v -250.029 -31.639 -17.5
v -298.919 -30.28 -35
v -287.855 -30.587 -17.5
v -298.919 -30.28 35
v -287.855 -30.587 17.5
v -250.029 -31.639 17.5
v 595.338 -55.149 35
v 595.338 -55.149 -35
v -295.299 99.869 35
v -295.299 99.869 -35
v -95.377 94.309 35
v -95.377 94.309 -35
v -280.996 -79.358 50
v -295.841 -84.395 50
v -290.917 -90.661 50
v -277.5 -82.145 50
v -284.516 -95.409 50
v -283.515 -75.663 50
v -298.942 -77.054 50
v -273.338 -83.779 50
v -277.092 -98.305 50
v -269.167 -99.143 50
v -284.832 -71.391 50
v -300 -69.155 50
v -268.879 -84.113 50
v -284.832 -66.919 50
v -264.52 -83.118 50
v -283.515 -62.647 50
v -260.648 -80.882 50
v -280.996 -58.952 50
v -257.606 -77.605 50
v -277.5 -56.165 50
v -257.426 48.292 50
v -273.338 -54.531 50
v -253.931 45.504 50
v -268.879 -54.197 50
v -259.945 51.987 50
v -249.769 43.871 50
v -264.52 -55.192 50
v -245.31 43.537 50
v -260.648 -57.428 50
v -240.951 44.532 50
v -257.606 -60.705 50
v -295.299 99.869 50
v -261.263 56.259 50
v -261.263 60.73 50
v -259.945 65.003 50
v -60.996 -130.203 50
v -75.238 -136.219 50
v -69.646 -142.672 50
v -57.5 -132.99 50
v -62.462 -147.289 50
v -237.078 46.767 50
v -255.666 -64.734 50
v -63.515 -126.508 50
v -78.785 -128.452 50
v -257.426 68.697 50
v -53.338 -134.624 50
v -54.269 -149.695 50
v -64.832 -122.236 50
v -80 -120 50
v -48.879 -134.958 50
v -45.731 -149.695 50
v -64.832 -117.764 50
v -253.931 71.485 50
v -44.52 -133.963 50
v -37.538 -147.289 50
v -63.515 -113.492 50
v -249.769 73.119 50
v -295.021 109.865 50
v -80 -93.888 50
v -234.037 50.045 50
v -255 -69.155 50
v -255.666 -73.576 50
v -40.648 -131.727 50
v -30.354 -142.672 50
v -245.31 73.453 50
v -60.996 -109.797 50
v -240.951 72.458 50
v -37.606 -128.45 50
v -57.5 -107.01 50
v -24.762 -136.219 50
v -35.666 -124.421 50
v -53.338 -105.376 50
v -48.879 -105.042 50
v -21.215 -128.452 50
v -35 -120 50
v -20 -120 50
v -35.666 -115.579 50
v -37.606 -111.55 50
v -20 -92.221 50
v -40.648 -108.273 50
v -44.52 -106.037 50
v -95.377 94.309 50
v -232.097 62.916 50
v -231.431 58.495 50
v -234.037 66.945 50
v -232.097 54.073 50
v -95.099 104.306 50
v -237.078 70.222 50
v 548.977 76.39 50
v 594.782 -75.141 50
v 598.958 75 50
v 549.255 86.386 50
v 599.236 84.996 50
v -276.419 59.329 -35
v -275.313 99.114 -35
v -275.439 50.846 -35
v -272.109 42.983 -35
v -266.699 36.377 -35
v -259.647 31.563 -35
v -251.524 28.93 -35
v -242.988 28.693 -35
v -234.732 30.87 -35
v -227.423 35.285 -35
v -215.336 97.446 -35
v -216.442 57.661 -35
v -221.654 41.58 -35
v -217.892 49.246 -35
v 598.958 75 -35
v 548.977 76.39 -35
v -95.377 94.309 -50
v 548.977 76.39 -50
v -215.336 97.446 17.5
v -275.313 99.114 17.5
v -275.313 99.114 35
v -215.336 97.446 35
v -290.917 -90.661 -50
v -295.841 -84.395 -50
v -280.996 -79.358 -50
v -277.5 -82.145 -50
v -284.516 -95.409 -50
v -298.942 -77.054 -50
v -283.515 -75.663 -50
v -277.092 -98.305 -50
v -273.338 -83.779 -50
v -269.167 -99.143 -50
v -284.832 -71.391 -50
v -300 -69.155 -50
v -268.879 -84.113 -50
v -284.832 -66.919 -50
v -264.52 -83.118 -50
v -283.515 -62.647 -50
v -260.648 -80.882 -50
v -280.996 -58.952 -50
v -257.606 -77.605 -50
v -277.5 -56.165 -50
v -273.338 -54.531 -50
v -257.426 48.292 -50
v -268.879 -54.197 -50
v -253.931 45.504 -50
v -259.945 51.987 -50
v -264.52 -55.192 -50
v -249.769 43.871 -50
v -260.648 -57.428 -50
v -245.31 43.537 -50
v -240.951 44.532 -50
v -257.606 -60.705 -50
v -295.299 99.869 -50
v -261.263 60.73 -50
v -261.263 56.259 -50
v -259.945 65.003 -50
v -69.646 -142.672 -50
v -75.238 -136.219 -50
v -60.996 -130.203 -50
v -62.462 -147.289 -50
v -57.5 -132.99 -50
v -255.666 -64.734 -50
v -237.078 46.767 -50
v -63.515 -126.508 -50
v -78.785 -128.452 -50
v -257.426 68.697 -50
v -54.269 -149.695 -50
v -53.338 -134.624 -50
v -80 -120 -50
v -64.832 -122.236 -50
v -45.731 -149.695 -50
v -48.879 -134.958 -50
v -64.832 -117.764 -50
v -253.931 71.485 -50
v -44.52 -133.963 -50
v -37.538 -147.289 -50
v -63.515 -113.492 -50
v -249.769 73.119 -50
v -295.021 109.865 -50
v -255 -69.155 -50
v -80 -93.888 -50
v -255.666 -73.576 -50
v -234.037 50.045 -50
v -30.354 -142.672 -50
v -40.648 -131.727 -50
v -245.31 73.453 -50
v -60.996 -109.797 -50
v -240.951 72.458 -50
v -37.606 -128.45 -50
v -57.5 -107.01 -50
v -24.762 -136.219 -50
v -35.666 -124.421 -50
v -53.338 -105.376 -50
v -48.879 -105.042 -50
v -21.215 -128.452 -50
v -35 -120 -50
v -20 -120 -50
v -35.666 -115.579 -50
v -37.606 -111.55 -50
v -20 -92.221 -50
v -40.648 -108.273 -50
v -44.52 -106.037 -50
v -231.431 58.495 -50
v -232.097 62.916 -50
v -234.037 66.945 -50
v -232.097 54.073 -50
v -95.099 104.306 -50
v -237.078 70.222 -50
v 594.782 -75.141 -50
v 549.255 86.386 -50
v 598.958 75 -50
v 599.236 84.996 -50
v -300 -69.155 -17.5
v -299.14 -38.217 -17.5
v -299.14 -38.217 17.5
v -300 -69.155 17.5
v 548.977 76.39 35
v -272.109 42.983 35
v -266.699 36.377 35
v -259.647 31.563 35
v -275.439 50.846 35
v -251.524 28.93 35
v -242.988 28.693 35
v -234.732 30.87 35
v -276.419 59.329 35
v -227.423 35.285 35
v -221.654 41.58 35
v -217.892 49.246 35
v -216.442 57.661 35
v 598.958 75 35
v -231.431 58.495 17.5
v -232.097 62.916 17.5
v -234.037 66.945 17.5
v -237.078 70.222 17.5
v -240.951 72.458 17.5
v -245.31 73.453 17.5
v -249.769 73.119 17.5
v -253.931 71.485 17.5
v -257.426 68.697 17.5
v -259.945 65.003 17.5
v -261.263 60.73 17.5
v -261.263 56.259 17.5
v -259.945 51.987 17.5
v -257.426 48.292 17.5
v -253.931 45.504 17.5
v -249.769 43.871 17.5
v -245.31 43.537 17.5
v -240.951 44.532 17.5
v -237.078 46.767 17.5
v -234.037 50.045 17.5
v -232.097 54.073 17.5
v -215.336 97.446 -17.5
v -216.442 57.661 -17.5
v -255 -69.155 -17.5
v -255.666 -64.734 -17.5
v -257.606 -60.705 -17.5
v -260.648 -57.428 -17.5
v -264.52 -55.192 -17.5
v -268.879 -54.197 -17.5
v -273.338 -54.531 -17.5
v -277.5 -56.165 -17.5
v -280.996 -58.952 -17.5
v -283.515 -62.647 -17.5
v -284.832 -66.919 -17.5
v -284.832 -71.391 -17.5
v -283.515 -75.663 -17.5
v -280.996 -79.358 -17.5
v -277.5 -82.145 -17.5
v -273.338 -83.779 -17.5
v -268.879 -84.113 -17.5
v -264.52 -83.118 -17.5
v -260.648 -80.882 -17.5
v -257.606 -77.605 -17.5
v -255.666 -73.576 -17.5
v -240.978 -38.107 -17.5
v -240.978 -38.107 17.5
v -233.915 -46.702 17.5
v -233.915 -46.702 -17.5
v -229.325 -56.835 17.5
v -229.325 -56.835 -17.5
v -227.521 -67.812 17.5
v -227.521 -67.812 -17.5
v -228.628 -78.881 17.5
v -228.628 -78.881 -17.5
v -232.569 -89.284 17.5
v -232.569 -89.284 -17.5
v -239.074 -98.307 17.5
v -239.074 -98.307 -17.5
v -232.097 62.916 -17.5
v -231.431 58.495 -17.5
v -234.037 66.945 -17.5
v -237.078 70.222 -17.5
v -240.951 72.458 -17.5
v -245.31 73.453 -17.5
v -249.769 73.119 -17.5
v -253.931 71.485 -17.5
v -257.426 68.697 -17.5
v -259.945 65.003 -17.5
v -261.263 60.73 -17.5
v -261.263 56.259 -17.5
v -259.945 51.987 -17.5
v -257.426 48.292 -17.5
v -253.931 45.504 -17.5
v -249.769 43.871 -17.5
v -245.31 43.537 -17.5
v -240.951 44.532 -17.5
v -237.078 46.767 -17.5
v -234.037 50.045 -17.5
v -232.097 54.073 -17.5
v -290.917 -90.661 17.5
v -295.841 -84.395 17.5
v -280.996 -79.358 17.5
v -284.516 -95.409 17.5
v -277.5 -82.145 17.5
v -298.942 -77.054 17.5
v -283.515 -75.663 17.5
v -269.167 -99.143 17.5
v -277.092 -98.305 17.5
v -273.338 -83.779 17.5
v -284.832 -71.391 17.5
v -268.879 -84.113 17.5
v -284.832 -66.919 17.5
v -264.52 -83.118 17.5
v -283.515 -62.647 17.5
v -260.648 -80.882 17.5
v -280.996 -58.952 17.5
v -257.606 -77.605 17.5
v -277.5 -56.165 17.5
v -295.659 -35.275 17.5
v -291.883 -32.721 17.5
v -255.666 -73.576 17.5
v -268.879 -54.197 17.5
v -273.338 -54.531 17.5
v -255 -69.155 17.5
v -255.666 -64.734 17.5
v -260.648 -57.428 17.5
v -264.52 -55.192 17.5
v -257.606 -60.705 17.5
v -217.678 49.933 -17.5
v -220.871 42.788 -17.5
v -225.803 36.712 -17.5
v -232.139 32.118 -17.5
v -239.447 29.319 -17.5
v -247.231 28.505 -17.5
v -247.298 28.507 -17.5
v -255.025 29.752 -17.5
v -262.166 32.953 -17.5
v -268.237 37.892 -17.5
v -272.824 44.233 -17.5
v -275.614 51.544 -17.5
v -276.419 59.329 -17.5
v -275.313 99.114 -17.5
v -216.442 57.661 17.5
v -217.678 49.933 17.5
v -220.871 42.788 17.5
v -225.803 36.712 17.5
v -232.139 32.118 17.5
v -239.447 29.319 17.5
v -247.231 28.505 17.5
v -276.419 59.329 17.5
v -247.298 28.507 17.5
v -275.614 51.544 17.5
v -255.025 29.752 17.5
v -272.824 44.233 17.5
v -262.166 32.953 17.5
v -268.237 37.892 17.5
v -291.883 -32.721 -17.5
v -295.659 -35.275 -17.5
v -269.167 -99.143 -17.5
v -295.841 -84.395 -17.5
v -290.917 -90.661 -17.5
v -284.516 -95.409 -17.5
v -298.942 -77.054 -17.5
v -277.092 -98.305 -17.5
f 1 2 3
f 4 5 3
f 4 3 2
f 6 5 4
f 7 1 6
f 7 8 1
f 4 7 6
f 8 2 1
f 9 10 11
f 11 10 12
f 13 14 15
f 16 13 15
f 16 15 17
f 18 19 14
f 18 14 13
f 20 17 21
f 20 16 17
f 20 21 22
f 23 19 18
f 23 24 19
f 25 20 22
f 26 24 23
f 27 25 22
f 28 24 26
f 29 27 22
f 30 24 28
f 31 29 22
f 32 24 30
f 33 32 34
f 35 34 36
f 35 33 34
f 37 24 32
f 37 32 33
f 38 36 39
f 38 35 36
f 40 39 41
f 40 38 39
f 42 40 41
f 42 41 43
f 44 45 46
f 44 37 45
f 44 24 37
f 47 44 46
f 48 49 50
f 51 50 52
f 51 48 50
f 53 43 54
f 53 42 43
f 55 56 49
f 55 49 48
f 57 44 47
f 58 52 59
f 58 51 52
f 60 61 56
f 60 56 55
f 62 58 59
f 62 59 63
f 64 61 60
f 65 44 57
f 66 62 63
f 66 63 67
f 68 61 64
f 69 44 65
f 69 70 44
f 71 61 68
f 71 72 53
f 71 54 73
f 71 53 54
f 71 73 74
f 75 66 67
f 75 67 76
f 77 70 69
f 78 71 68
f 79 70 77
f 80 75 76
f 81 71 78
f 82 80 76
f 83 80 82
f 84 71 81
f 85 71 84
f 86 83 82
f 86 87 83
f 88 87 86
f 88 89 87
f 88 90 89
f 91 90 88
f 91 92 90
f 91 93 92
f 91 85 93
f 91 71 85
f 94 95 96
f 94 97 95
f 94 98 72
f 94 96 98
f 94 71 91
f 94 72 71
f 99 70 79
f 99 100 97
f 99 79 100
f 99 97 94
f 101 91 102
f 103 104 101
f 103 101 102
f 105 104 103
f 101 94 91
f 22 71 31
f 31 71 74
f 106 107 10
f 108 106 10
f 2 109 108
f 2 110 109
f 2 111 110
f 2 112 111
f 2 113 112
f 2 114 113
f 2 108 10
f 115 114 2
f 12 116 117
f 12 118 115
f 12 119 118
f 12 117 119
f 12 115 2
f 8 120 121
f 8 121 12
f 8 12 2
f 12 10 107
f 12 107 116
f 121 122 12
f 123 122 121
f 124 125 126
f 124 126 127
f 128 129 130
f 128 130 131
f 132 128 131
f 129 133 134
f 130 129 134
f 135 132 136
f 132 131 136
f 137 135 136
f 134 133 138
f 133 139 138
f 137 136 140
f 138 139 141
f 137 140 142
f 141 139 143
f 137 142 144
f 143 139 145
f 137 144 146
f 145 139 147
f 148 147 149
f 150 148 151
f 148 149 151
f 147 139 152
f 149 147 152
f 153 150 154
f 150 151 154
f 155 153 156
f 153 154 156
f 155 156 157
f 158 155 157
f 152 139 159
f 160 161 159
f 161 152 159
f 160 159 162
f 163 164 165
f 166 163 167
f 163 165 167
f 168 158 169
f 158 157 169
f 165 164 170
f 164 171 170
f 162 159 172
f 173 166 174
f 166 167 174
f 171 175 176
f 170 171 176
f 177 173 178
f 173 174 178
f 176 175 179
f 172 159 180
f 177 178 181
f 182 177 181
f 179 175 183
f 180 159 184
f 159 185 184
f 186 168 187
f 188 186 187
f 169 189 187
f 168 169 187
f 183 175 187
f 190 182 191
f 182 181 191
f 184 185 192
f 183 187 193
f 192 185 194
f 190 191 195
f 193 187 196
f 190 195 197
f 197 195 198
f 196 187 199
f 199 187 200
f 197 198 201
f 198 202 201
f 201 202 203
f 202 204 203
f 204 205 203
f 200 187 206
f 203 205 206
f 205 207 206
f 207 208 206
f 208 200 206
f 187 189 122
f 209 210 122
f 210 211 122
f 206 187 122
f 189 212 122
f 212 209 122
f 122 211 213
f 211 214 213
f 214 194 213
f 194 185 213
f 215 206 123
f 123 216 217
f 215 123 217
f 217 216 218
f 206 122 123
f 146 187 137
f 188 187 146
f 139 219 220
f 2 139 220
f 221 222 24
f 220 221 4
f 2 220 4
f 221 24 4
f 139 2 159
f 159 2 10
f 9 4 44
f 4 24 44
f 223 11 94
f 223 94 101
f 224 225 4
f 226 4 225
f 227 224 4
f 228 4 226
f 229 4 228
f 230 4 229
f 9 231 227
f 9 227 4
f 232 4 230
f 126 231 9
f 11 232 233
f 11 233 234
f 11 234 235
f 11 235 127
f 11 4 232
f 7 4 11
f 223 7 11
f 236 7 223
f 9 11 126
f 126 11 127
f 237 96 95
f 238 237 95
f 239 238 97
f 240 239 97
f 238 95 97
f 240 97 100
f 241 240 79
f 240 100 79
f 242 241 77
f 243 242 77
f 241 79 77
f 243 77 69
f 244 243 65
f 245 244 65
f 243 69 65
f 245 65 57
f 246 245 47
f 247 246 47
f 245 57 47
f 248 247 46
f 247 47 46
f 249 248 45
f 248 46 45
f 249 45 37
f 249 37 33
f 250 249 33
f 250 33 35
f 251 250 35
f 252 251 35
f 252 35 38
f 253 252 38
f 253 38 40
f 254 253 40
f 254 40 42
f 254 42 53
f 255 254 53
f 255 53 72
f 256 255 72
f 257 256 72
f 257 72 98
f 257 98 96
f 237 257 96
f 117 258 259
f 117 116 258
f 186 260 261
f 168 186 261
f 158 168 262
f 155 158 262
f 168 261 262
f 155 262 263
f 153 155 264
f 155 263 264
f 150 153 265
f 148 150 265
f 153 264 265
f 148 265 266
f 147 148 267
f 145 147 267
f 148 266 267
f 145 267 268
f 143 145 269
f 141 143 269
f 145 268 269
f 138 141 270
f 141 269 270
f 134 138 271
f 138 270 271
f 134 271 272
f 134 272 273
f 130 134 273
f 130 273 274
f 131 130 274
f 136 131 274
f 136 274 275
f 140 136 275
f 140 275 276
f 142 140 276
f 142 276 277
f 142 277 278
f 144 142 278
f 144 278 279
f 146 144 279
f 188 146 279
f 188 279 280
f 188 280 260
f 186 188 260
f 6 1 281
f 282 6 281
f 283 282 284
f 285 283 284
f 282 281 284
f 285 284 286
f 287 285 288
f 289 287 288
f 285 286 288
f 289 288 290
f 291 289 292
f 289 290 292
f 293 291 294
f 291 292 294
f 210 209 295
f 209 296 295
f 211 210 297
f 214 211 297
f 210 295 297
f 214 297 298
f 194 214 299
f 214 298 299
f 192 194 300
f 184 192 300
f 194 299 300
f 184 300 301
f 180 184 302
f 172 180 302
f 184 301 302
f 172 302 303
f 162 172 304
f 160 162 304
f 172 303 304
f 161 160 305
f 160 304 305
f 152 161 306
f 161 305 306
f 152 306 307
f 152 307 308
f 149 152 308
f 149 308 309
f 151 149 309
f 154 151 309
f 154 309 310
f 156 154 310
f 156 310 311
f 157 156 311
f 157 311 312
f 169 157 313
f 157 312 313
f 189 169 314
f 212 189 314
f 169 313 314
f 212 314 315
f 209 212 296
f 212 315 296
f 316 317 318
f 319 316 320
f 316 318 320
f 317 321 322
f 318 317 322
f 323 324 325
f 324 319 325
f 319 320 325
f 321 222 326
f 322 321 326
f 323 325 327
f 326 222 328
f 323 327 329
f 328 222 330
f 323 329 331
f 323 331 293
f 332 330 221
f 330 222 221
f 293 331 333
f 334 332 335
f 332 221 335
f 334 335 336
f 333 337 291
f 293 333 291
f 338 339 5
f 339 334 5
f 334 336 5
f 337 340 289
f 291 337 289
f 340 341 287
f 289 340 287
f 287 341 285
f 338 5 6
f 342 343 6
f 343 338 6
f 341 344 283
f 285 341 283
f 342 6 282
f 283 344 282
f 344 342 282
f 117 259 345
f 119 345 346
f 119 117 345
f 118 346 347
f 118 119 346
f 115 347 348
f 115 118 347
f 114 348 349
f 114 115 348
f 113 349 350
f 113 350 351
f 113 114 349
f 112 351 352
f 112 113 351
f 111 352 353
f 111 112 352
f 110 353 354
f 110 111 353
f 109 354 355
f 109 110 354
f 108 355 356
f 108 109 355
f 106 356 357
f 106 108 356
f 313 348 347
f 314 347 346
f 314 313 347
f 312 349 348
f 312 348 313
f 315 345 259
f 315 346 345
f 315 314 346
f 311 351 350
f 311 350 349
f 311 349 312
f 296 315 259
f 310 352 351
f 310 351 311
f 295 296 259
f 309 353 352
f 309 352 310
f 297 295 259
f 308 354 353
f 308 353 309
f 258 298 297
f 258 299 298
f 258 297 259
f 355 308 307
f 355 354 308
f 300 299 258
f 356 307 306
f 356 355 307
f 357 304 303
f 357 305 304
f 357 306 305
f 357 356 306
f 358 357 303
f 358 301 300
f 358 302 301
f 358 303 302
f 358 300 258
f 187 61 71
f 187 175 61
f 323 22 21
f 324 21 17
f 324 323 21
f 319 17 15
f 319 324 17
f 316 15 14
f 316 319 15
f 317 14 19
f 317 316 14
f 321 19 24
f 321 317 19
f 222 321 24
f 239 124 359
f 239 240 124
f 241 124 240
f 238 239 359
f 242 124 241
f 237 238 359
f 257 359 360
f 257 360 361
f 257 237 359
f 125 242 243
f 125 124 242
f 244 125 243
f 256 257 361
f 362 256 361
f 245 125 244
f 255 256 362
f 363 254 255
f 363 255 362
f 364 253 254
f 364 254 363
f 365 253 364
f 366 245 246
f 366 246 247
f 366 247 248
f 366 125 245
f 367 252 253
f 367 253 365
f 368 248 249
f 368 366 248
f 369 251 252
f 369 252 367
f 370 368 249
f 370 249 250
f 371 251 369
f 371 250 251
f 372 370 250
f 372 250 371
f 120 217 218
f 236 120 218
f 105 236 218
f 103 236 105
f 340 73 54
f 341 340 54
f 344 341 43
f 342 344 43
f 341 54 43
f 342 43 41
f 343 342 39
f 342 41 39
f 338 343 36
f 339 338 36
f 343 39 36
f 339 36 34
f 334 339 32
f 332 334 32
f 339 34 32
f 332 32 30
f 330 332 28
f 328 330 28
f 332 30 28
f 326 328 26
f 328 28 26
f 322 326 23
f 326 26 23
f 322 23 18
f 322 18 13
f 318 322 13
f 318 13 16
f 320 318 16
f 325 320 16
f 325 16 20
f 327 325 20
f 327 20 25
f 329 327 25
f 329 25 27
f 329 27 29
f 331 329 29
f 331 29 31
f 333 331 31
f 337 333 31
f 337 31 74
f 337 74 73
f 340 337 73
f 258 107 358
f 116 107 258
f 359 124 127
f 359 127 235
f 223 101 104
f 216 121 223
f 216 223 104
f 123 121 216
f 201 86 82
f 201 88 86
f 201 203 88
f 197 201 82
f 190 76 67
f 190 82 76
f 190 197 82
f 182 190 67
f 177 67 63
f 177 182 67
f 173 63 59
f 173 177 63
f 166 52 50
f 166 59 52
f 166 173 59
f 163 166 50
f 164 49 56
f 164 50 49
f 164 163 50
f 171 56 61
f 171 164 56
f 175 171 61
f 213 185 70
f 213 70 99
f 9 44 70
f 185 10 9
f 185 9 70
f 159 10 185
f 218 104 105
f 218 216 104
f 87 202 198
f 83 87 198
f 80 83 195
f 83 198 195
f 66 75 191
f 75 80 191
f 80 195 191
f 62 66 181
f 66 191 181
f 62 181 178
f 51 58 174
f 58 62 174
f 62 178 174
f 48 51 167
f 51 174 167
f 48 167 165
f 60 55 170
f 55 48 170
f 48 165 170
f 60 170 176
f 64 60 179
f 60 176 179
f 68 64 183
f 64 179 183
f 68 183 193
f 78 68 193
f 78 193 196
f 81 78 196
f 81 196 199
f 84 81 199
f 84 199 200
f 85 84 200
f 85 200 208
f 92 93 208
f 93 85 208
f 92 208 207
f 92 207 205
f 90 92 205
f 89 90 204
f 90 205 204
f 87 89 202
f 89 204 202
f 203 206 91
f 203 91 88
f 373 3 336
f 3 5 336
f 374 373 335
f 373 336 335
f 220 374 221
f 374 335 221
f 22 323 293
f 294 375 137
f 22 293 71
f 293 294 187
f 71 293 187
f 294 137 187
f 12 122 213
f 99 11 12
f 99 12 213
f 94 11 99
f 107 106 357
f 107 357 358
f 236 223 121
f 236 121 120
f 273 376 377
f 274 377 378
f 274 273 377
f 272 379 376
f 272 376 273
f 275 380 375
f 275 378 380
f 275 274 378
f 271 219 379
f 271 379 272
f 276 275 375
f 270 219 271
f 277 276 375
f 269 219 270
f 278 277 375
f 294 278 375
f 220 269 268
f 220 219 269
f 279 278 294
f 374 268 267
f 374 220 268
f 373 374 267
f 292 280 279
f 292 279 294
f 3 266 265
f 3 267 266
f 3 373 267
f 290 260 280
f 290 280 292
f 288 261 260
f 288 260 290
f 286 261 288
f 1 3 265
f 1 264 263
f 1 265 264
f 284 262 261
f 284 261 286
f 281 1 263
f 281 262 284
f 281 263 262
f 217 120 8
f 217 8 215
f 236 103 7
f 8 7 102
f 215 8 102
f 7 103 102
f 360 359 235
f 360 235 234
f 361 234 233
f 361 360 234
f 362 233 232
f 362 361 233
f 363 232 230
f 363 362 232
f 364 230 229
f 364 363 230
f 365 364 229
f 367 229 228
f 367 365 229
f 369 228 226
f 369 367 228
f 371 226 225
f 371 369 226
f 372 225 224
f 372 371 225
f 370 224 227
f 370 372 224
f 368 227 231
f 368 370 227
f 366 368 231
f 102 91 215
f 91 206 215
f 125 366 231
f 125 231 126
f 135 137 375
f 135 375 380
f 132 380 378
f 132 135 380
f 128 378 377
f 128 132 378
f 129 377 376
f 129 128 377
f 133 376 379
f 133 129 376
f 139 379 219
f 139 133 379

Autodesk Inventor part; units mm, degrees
ref_plane "YZ Plane" through (0, 0, 0) normal (1, 0, 0) x (0, 1, 0)
ref_plane "XZ Plane" through (0, 0, 0) normal (0, 1, 0) x (-1, 0, 0)
ref_plane "XY Plane" through (0, 0, 0) normal (0, 0, 1) x (1, 0, 0)
sketch "草图1" plane through (0, 0, 0) normal (0, 0, 1) x (1, 0, 0)
  line L0 (598.9577, 75) -> (600, -74.9964)
  line L1 (-601.0423, 75.1267) -> (600, -74.9964) construction
  line L2 (598.9577, 75) -> (-593.8092, -74.3553) construction
  line L3 (-300, 0) -> (-300, 100)
  line L4 (-300, -100) -> (600, -74.9964)
  line L5 (-300, 100) -> (598.9577, 75)
  line L6 (-300, 0) -> (-300, -100)
  line L7 (599.4789, 0) -> (-300, 0)
  line L8 (0, 0) -> (0, -189.9048)
  dimension "d0" = 150
  dimension "d31" = 75
  dimension "d32" = 0
  dimension "d33" = 100
  dimension "d34" = 100
  dimension "d35" = 100
  dimension "d51" = 300
extrude "拉伸1" add sketch "草图1" along normal mid plane 100
sketch "草图2" plane through (0, 0, 0) normal (0, 0, 1) x (1, 0, 0)
  circle A0 centre (-50, -120) radius 15
  line L0 (0, 0) -> (0, -405.8359)
  line L1 (0, 0) -> (-641.787, 0)
  line L2 (-80, -120) -> (-80, -93.888)
  line L3 (-300, -100) -> (600, -74.9964) projected
  line L4 (-20, -92.2211) -> (-20, -120)
  arc A1 (-80, -120) -> (-20, -120) centre (-50, -120) ccw
  dimension "d8" = 30
  dimension "d9" = 120
  dimension "d10" = 50
  dimension "d28" = 30
extrude "拉伸2" add sketch "草图2" along normal mid plane 100
fillet "圆角1" radius 30 1 edges at (-300, -100, 0)
sketch "草图4" plane through (0, 0, 50) normal (0, 0, 1) x (1, 0, 0)
  arc A0 (-300, -69.155) -> (-269.1669, -99.1434) centre (-270, -69.155) ccw projected
  circle A1 centre (-270, -69.155) radius 15
  point P0 (0, 0)
  dimension "d15" = 30
extrude "拉伸3" cut sketch "草图4" against normal blind 100
sketch "草图5" plane through (0, 0, 50) normal (0, 0, 1) x (1, 0, 0)
  arc A0 (-300, -69.155) -> (-269.1669, -99.1434) centre (-270, -69.155) ccw projected
  line L0 (-300, -69.155) -> (-300, 100)
  line L1 (598.9577, 75) -> (-300, 100) projected
  line L2 (-300, 100) -> (-300, -69.155) projected
  line L3 (-300, 100) -> (-300, 100)
  line L4 (-300, -69.155) -> (-295.2994, 99.8693)
  line L5 (-295.2994, 99.8693) -> (-300, 100)
  line L6 (598.9577, 75) -> (594.7823, -75.1413)
  line L7 (600, -74.9964) -> (-269.1669, -99.1434) projected
  line L8 (598.9577, 75) -> (600, -74.9964) projected
  line L9 (600, -74.9964) -> (598.9577, 75)
  point P0 (0, 0)
  point P1 (-603.2218, 0)
  point P2 (599.4789, 0)
  dimension "d20" = 90
extrude "拉伸4" cut sketch "草图5" against normal blind 100 contours L0 L1 L4 | L6 L8 L7
sketch "草图6" plane through (594.7823, -75.1413, 50) normal (0.9996135, -0.0277992, 0) x (0, 0, -1)
  line L0 (0, 0) -> (0, 150.1994) projected
  line L1 (0, 150.1994) -> (100, 150.1994) projected
  line L2 (50, 150.1994) -> (50, 0)
  line L3 (100, 0) -> (0, 0) projected
  line L4 (100, 150.1994) -> (100, 0) projected
  line L5 (15, 151) -> (85, 151)
  line L6 (85, 151) -> (85, 20)
  line L7 (85, 20) -> (15, 20)
  line L8 (15, 20) -> (15, 151)
  line L9 (15, 151) -> (85, 20) construction
  line L10 (85, 151) -> (15, 20) construction
  point P0 (50, 58.5778)
  point P1 (50, 85.5)
  point P2 (0, 100.4456)
  point P3 (0, 175.4618)
  point P4 (100, 175.4618)
  point P5 (100, 100.4456)
  dimension "d21" = 70
  dimension "d22" = 131
  dimension "d63" = 20
extrude "拉伸5" cut sketch "草图6" against normal through all contours L8 L5 L6 L1 | L1 L2 L7 L8 | L2 L1 L6 L7
sketch "草图7" plane through (0, 0, 0) normal (0, 0, 1) x (1, 0, 0)
  arc A0 (-300, -69.155) -> (-269.1669, -99.1434) centre (-270, -69.155) ccw projected
  circle A1 centre (-270, -69.155) radius 42.5
  point P0 (0, 0)
  dimension "d25" = 85
extrude "拉伸6" cut sketch "草图7" along normal mid plane 35
sketch "草图8" plane through (0, 0, 0) normal (0, 0, 1) x (1, 0, 0)
  line L0 (-632.149, 69.2216) -> (221.7891, 45.4736)
  line L1 (-295.2994, 99.8693) -> (-298.9189, -30.2798) projected
  line L2 (598.9577, 75) -> (-295.2994, 99.8693) projected
  circle A0 centre (-246.4307, 58.4948) radius 15
  arc A1 (-276.4191, 59.3288) -> (-216.4423, 57.6608) centre (-246.4307, 58.4948) ccw
  line L3 (-276.4191, 59.3288) -> (-275.3072, 99.3133)
  line L4 (-275.3072, 99.3133) -> (-520.3529, 106.128)
  line L5 (-275.3127, 99.114) -> (-215.3359, 97.446)
  line L6 (598.9522, 74.8007) -> (-295.305, 99.67) projected
  line L7 (-215.3359, 97.446) -> (-216.4423, 57.6608)
  point P0 (0, 0)
  dimension "d36" = 40
  dimension "d37" = 30
  dimension "d38" = 60
  dimension "d39" = 50
  dimension "d40" = 90
  dimension "d41" = 60
extrude "拉伸7" add sketch "草图8" along normal mid plane 70 contours L3 L5 L7 L0 A0 | L0 A0 A1 | A0 L0 | L0 A0
sketch "草图9" plane through (0, 0, 50) normal (0, 0, 1) x (1, 0, 0)
  arc A0 (-276.4191, 59.3288) -> (-216.4423, 57.6608) centre (-246.4307, 58.4948) ccw projected
  circle A1 centre (-246.4307, 58.4948) radius 15
  point P0 (0, 0)
  dimension "d44" = 30
extrude "拉伸8" cut sketch "草图9" against normal through all
sketch "草图10" plane through (-276.4191, 59.3288, -35) normal (-0.9996135, 0.0277992, 0) x (0, 0, 1)
  line L0 (0, 39.8006) -> (70, 39.8006) projected
  line L1 (35, 39.8006) -> (35, -30)
  line L2 (0, -30) -> (70, -30) projected
  line L3 (17.5, 39.8006) -> (52.5, 39.8006)
  line L4 (52.5, 39.8006) -> (52.5, -30)
  line L5 (52.5, -30) -> (17.5, -30)
  line L6 (17.5, -30) -> (17.5, 39.8006)
  line L7 (17.5, 39.8006) -> (52.5, -30) construction
  line L8 (52.5, 39.8006) -> (17.5, -30) construction
  point P0 (35, -51.6216)
  point P1 (35, 4.9003)
  dimension "d47" = 35
extrude "拉伸9" cut sketch "草图10" against normal blind 60
sketch "草图13" plane through (-295.2994, 99.8693, 50) normal (0.0277992, 0.9996135, 0) x (0.9996135, -0.0277992, 0)
  line L0 (0, 15) -> (0, 85) projected
  line L1 (0, 50) -> (323.6348, 50)
  line L2 (0, 100) -> (31.6549, 100) projected
  line L3 (200, 0) -> (0, 0)
  line L4 (0, 0) -> (0, 100)
  line L5 (0, 100) -> (200, 100)
  line L6 (200, 100) -> (200, 0)
  line L7 (200, 0) -> (0, 100) construction
  line L8 (0, 0) -> (200, 100) construction
  line L9 (894.6029, 100) -> (894.6029, 0) projected
  line L10 (844.6029, 100) -> (894.6029, 100)
  line L11 (894.6029, 100) -> (894.6029, 0)
  line L12 (894.6029, 0) -> (844.6029, 0)
  line L13 (844.6029, 0) -> (844.6029, 100)
  line L14 (844.6029, 100) -> (894.6029, 0) construction
  line L15 (894.6029, 100) -> (844.6029, 0) construction
  point P0 (297.9616, 50)
  point P1 (100, 50)
  point P2 (869.6029, 50)
  dimension "d64" = 200
  dimension "d65" = 50
extrude "拉伸12" add sketch "草图13" along normal blind 10
properties part number "DipperParent" material "钢，高强度，低合金"
